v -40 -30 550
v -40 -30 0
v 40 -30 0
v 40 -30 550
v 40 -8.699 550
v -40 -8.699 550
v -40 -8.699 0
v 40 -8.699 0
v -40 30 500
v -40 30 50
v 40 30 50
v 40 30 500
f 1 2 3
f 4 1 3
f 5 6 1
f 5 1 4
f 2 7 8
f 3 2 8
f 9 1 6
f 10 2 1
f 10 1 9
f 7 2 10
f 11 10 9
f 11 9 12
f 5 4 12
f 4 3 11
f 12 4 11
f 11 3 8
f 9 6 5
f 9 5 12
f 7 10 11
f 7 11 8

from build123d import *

# Parameters (mm, degrees)
SKETCH2_W           = 80
SKETCH2_H           = 60
BOSS_EXTRUDE1_DEPTH = 550
CUT_EXTRUDE3_DEPTH  = 80


with BuildPart() as part:
    # Sketch2 → Boss-Extrude1 (new body)
    with BuildSketch(Plane.XY):
        Rectangle(SKETCH2_W, SKETCH2_H)
    extrude(amount=BOSS_EXTRUDE1_DEPTH)

    # Sketch4 → Cut-Extrude3 (cut)
    with BuildSketch(Plane(origin=(40, 0, 0), x_dir=(0, 0, -1), z_dir=(1, 0, 0))):
        Polygon((-550, 30), (-550, -8.699429877), (-500, 30), align=None)
        Polygon((-50, 30), (0, -8.699429877), (0, 30), align=None)
    extrude(amount=-CUT_EXTRUDE3_DEPTH, mode=Mode.SUBTRACT)


solid = part.part
